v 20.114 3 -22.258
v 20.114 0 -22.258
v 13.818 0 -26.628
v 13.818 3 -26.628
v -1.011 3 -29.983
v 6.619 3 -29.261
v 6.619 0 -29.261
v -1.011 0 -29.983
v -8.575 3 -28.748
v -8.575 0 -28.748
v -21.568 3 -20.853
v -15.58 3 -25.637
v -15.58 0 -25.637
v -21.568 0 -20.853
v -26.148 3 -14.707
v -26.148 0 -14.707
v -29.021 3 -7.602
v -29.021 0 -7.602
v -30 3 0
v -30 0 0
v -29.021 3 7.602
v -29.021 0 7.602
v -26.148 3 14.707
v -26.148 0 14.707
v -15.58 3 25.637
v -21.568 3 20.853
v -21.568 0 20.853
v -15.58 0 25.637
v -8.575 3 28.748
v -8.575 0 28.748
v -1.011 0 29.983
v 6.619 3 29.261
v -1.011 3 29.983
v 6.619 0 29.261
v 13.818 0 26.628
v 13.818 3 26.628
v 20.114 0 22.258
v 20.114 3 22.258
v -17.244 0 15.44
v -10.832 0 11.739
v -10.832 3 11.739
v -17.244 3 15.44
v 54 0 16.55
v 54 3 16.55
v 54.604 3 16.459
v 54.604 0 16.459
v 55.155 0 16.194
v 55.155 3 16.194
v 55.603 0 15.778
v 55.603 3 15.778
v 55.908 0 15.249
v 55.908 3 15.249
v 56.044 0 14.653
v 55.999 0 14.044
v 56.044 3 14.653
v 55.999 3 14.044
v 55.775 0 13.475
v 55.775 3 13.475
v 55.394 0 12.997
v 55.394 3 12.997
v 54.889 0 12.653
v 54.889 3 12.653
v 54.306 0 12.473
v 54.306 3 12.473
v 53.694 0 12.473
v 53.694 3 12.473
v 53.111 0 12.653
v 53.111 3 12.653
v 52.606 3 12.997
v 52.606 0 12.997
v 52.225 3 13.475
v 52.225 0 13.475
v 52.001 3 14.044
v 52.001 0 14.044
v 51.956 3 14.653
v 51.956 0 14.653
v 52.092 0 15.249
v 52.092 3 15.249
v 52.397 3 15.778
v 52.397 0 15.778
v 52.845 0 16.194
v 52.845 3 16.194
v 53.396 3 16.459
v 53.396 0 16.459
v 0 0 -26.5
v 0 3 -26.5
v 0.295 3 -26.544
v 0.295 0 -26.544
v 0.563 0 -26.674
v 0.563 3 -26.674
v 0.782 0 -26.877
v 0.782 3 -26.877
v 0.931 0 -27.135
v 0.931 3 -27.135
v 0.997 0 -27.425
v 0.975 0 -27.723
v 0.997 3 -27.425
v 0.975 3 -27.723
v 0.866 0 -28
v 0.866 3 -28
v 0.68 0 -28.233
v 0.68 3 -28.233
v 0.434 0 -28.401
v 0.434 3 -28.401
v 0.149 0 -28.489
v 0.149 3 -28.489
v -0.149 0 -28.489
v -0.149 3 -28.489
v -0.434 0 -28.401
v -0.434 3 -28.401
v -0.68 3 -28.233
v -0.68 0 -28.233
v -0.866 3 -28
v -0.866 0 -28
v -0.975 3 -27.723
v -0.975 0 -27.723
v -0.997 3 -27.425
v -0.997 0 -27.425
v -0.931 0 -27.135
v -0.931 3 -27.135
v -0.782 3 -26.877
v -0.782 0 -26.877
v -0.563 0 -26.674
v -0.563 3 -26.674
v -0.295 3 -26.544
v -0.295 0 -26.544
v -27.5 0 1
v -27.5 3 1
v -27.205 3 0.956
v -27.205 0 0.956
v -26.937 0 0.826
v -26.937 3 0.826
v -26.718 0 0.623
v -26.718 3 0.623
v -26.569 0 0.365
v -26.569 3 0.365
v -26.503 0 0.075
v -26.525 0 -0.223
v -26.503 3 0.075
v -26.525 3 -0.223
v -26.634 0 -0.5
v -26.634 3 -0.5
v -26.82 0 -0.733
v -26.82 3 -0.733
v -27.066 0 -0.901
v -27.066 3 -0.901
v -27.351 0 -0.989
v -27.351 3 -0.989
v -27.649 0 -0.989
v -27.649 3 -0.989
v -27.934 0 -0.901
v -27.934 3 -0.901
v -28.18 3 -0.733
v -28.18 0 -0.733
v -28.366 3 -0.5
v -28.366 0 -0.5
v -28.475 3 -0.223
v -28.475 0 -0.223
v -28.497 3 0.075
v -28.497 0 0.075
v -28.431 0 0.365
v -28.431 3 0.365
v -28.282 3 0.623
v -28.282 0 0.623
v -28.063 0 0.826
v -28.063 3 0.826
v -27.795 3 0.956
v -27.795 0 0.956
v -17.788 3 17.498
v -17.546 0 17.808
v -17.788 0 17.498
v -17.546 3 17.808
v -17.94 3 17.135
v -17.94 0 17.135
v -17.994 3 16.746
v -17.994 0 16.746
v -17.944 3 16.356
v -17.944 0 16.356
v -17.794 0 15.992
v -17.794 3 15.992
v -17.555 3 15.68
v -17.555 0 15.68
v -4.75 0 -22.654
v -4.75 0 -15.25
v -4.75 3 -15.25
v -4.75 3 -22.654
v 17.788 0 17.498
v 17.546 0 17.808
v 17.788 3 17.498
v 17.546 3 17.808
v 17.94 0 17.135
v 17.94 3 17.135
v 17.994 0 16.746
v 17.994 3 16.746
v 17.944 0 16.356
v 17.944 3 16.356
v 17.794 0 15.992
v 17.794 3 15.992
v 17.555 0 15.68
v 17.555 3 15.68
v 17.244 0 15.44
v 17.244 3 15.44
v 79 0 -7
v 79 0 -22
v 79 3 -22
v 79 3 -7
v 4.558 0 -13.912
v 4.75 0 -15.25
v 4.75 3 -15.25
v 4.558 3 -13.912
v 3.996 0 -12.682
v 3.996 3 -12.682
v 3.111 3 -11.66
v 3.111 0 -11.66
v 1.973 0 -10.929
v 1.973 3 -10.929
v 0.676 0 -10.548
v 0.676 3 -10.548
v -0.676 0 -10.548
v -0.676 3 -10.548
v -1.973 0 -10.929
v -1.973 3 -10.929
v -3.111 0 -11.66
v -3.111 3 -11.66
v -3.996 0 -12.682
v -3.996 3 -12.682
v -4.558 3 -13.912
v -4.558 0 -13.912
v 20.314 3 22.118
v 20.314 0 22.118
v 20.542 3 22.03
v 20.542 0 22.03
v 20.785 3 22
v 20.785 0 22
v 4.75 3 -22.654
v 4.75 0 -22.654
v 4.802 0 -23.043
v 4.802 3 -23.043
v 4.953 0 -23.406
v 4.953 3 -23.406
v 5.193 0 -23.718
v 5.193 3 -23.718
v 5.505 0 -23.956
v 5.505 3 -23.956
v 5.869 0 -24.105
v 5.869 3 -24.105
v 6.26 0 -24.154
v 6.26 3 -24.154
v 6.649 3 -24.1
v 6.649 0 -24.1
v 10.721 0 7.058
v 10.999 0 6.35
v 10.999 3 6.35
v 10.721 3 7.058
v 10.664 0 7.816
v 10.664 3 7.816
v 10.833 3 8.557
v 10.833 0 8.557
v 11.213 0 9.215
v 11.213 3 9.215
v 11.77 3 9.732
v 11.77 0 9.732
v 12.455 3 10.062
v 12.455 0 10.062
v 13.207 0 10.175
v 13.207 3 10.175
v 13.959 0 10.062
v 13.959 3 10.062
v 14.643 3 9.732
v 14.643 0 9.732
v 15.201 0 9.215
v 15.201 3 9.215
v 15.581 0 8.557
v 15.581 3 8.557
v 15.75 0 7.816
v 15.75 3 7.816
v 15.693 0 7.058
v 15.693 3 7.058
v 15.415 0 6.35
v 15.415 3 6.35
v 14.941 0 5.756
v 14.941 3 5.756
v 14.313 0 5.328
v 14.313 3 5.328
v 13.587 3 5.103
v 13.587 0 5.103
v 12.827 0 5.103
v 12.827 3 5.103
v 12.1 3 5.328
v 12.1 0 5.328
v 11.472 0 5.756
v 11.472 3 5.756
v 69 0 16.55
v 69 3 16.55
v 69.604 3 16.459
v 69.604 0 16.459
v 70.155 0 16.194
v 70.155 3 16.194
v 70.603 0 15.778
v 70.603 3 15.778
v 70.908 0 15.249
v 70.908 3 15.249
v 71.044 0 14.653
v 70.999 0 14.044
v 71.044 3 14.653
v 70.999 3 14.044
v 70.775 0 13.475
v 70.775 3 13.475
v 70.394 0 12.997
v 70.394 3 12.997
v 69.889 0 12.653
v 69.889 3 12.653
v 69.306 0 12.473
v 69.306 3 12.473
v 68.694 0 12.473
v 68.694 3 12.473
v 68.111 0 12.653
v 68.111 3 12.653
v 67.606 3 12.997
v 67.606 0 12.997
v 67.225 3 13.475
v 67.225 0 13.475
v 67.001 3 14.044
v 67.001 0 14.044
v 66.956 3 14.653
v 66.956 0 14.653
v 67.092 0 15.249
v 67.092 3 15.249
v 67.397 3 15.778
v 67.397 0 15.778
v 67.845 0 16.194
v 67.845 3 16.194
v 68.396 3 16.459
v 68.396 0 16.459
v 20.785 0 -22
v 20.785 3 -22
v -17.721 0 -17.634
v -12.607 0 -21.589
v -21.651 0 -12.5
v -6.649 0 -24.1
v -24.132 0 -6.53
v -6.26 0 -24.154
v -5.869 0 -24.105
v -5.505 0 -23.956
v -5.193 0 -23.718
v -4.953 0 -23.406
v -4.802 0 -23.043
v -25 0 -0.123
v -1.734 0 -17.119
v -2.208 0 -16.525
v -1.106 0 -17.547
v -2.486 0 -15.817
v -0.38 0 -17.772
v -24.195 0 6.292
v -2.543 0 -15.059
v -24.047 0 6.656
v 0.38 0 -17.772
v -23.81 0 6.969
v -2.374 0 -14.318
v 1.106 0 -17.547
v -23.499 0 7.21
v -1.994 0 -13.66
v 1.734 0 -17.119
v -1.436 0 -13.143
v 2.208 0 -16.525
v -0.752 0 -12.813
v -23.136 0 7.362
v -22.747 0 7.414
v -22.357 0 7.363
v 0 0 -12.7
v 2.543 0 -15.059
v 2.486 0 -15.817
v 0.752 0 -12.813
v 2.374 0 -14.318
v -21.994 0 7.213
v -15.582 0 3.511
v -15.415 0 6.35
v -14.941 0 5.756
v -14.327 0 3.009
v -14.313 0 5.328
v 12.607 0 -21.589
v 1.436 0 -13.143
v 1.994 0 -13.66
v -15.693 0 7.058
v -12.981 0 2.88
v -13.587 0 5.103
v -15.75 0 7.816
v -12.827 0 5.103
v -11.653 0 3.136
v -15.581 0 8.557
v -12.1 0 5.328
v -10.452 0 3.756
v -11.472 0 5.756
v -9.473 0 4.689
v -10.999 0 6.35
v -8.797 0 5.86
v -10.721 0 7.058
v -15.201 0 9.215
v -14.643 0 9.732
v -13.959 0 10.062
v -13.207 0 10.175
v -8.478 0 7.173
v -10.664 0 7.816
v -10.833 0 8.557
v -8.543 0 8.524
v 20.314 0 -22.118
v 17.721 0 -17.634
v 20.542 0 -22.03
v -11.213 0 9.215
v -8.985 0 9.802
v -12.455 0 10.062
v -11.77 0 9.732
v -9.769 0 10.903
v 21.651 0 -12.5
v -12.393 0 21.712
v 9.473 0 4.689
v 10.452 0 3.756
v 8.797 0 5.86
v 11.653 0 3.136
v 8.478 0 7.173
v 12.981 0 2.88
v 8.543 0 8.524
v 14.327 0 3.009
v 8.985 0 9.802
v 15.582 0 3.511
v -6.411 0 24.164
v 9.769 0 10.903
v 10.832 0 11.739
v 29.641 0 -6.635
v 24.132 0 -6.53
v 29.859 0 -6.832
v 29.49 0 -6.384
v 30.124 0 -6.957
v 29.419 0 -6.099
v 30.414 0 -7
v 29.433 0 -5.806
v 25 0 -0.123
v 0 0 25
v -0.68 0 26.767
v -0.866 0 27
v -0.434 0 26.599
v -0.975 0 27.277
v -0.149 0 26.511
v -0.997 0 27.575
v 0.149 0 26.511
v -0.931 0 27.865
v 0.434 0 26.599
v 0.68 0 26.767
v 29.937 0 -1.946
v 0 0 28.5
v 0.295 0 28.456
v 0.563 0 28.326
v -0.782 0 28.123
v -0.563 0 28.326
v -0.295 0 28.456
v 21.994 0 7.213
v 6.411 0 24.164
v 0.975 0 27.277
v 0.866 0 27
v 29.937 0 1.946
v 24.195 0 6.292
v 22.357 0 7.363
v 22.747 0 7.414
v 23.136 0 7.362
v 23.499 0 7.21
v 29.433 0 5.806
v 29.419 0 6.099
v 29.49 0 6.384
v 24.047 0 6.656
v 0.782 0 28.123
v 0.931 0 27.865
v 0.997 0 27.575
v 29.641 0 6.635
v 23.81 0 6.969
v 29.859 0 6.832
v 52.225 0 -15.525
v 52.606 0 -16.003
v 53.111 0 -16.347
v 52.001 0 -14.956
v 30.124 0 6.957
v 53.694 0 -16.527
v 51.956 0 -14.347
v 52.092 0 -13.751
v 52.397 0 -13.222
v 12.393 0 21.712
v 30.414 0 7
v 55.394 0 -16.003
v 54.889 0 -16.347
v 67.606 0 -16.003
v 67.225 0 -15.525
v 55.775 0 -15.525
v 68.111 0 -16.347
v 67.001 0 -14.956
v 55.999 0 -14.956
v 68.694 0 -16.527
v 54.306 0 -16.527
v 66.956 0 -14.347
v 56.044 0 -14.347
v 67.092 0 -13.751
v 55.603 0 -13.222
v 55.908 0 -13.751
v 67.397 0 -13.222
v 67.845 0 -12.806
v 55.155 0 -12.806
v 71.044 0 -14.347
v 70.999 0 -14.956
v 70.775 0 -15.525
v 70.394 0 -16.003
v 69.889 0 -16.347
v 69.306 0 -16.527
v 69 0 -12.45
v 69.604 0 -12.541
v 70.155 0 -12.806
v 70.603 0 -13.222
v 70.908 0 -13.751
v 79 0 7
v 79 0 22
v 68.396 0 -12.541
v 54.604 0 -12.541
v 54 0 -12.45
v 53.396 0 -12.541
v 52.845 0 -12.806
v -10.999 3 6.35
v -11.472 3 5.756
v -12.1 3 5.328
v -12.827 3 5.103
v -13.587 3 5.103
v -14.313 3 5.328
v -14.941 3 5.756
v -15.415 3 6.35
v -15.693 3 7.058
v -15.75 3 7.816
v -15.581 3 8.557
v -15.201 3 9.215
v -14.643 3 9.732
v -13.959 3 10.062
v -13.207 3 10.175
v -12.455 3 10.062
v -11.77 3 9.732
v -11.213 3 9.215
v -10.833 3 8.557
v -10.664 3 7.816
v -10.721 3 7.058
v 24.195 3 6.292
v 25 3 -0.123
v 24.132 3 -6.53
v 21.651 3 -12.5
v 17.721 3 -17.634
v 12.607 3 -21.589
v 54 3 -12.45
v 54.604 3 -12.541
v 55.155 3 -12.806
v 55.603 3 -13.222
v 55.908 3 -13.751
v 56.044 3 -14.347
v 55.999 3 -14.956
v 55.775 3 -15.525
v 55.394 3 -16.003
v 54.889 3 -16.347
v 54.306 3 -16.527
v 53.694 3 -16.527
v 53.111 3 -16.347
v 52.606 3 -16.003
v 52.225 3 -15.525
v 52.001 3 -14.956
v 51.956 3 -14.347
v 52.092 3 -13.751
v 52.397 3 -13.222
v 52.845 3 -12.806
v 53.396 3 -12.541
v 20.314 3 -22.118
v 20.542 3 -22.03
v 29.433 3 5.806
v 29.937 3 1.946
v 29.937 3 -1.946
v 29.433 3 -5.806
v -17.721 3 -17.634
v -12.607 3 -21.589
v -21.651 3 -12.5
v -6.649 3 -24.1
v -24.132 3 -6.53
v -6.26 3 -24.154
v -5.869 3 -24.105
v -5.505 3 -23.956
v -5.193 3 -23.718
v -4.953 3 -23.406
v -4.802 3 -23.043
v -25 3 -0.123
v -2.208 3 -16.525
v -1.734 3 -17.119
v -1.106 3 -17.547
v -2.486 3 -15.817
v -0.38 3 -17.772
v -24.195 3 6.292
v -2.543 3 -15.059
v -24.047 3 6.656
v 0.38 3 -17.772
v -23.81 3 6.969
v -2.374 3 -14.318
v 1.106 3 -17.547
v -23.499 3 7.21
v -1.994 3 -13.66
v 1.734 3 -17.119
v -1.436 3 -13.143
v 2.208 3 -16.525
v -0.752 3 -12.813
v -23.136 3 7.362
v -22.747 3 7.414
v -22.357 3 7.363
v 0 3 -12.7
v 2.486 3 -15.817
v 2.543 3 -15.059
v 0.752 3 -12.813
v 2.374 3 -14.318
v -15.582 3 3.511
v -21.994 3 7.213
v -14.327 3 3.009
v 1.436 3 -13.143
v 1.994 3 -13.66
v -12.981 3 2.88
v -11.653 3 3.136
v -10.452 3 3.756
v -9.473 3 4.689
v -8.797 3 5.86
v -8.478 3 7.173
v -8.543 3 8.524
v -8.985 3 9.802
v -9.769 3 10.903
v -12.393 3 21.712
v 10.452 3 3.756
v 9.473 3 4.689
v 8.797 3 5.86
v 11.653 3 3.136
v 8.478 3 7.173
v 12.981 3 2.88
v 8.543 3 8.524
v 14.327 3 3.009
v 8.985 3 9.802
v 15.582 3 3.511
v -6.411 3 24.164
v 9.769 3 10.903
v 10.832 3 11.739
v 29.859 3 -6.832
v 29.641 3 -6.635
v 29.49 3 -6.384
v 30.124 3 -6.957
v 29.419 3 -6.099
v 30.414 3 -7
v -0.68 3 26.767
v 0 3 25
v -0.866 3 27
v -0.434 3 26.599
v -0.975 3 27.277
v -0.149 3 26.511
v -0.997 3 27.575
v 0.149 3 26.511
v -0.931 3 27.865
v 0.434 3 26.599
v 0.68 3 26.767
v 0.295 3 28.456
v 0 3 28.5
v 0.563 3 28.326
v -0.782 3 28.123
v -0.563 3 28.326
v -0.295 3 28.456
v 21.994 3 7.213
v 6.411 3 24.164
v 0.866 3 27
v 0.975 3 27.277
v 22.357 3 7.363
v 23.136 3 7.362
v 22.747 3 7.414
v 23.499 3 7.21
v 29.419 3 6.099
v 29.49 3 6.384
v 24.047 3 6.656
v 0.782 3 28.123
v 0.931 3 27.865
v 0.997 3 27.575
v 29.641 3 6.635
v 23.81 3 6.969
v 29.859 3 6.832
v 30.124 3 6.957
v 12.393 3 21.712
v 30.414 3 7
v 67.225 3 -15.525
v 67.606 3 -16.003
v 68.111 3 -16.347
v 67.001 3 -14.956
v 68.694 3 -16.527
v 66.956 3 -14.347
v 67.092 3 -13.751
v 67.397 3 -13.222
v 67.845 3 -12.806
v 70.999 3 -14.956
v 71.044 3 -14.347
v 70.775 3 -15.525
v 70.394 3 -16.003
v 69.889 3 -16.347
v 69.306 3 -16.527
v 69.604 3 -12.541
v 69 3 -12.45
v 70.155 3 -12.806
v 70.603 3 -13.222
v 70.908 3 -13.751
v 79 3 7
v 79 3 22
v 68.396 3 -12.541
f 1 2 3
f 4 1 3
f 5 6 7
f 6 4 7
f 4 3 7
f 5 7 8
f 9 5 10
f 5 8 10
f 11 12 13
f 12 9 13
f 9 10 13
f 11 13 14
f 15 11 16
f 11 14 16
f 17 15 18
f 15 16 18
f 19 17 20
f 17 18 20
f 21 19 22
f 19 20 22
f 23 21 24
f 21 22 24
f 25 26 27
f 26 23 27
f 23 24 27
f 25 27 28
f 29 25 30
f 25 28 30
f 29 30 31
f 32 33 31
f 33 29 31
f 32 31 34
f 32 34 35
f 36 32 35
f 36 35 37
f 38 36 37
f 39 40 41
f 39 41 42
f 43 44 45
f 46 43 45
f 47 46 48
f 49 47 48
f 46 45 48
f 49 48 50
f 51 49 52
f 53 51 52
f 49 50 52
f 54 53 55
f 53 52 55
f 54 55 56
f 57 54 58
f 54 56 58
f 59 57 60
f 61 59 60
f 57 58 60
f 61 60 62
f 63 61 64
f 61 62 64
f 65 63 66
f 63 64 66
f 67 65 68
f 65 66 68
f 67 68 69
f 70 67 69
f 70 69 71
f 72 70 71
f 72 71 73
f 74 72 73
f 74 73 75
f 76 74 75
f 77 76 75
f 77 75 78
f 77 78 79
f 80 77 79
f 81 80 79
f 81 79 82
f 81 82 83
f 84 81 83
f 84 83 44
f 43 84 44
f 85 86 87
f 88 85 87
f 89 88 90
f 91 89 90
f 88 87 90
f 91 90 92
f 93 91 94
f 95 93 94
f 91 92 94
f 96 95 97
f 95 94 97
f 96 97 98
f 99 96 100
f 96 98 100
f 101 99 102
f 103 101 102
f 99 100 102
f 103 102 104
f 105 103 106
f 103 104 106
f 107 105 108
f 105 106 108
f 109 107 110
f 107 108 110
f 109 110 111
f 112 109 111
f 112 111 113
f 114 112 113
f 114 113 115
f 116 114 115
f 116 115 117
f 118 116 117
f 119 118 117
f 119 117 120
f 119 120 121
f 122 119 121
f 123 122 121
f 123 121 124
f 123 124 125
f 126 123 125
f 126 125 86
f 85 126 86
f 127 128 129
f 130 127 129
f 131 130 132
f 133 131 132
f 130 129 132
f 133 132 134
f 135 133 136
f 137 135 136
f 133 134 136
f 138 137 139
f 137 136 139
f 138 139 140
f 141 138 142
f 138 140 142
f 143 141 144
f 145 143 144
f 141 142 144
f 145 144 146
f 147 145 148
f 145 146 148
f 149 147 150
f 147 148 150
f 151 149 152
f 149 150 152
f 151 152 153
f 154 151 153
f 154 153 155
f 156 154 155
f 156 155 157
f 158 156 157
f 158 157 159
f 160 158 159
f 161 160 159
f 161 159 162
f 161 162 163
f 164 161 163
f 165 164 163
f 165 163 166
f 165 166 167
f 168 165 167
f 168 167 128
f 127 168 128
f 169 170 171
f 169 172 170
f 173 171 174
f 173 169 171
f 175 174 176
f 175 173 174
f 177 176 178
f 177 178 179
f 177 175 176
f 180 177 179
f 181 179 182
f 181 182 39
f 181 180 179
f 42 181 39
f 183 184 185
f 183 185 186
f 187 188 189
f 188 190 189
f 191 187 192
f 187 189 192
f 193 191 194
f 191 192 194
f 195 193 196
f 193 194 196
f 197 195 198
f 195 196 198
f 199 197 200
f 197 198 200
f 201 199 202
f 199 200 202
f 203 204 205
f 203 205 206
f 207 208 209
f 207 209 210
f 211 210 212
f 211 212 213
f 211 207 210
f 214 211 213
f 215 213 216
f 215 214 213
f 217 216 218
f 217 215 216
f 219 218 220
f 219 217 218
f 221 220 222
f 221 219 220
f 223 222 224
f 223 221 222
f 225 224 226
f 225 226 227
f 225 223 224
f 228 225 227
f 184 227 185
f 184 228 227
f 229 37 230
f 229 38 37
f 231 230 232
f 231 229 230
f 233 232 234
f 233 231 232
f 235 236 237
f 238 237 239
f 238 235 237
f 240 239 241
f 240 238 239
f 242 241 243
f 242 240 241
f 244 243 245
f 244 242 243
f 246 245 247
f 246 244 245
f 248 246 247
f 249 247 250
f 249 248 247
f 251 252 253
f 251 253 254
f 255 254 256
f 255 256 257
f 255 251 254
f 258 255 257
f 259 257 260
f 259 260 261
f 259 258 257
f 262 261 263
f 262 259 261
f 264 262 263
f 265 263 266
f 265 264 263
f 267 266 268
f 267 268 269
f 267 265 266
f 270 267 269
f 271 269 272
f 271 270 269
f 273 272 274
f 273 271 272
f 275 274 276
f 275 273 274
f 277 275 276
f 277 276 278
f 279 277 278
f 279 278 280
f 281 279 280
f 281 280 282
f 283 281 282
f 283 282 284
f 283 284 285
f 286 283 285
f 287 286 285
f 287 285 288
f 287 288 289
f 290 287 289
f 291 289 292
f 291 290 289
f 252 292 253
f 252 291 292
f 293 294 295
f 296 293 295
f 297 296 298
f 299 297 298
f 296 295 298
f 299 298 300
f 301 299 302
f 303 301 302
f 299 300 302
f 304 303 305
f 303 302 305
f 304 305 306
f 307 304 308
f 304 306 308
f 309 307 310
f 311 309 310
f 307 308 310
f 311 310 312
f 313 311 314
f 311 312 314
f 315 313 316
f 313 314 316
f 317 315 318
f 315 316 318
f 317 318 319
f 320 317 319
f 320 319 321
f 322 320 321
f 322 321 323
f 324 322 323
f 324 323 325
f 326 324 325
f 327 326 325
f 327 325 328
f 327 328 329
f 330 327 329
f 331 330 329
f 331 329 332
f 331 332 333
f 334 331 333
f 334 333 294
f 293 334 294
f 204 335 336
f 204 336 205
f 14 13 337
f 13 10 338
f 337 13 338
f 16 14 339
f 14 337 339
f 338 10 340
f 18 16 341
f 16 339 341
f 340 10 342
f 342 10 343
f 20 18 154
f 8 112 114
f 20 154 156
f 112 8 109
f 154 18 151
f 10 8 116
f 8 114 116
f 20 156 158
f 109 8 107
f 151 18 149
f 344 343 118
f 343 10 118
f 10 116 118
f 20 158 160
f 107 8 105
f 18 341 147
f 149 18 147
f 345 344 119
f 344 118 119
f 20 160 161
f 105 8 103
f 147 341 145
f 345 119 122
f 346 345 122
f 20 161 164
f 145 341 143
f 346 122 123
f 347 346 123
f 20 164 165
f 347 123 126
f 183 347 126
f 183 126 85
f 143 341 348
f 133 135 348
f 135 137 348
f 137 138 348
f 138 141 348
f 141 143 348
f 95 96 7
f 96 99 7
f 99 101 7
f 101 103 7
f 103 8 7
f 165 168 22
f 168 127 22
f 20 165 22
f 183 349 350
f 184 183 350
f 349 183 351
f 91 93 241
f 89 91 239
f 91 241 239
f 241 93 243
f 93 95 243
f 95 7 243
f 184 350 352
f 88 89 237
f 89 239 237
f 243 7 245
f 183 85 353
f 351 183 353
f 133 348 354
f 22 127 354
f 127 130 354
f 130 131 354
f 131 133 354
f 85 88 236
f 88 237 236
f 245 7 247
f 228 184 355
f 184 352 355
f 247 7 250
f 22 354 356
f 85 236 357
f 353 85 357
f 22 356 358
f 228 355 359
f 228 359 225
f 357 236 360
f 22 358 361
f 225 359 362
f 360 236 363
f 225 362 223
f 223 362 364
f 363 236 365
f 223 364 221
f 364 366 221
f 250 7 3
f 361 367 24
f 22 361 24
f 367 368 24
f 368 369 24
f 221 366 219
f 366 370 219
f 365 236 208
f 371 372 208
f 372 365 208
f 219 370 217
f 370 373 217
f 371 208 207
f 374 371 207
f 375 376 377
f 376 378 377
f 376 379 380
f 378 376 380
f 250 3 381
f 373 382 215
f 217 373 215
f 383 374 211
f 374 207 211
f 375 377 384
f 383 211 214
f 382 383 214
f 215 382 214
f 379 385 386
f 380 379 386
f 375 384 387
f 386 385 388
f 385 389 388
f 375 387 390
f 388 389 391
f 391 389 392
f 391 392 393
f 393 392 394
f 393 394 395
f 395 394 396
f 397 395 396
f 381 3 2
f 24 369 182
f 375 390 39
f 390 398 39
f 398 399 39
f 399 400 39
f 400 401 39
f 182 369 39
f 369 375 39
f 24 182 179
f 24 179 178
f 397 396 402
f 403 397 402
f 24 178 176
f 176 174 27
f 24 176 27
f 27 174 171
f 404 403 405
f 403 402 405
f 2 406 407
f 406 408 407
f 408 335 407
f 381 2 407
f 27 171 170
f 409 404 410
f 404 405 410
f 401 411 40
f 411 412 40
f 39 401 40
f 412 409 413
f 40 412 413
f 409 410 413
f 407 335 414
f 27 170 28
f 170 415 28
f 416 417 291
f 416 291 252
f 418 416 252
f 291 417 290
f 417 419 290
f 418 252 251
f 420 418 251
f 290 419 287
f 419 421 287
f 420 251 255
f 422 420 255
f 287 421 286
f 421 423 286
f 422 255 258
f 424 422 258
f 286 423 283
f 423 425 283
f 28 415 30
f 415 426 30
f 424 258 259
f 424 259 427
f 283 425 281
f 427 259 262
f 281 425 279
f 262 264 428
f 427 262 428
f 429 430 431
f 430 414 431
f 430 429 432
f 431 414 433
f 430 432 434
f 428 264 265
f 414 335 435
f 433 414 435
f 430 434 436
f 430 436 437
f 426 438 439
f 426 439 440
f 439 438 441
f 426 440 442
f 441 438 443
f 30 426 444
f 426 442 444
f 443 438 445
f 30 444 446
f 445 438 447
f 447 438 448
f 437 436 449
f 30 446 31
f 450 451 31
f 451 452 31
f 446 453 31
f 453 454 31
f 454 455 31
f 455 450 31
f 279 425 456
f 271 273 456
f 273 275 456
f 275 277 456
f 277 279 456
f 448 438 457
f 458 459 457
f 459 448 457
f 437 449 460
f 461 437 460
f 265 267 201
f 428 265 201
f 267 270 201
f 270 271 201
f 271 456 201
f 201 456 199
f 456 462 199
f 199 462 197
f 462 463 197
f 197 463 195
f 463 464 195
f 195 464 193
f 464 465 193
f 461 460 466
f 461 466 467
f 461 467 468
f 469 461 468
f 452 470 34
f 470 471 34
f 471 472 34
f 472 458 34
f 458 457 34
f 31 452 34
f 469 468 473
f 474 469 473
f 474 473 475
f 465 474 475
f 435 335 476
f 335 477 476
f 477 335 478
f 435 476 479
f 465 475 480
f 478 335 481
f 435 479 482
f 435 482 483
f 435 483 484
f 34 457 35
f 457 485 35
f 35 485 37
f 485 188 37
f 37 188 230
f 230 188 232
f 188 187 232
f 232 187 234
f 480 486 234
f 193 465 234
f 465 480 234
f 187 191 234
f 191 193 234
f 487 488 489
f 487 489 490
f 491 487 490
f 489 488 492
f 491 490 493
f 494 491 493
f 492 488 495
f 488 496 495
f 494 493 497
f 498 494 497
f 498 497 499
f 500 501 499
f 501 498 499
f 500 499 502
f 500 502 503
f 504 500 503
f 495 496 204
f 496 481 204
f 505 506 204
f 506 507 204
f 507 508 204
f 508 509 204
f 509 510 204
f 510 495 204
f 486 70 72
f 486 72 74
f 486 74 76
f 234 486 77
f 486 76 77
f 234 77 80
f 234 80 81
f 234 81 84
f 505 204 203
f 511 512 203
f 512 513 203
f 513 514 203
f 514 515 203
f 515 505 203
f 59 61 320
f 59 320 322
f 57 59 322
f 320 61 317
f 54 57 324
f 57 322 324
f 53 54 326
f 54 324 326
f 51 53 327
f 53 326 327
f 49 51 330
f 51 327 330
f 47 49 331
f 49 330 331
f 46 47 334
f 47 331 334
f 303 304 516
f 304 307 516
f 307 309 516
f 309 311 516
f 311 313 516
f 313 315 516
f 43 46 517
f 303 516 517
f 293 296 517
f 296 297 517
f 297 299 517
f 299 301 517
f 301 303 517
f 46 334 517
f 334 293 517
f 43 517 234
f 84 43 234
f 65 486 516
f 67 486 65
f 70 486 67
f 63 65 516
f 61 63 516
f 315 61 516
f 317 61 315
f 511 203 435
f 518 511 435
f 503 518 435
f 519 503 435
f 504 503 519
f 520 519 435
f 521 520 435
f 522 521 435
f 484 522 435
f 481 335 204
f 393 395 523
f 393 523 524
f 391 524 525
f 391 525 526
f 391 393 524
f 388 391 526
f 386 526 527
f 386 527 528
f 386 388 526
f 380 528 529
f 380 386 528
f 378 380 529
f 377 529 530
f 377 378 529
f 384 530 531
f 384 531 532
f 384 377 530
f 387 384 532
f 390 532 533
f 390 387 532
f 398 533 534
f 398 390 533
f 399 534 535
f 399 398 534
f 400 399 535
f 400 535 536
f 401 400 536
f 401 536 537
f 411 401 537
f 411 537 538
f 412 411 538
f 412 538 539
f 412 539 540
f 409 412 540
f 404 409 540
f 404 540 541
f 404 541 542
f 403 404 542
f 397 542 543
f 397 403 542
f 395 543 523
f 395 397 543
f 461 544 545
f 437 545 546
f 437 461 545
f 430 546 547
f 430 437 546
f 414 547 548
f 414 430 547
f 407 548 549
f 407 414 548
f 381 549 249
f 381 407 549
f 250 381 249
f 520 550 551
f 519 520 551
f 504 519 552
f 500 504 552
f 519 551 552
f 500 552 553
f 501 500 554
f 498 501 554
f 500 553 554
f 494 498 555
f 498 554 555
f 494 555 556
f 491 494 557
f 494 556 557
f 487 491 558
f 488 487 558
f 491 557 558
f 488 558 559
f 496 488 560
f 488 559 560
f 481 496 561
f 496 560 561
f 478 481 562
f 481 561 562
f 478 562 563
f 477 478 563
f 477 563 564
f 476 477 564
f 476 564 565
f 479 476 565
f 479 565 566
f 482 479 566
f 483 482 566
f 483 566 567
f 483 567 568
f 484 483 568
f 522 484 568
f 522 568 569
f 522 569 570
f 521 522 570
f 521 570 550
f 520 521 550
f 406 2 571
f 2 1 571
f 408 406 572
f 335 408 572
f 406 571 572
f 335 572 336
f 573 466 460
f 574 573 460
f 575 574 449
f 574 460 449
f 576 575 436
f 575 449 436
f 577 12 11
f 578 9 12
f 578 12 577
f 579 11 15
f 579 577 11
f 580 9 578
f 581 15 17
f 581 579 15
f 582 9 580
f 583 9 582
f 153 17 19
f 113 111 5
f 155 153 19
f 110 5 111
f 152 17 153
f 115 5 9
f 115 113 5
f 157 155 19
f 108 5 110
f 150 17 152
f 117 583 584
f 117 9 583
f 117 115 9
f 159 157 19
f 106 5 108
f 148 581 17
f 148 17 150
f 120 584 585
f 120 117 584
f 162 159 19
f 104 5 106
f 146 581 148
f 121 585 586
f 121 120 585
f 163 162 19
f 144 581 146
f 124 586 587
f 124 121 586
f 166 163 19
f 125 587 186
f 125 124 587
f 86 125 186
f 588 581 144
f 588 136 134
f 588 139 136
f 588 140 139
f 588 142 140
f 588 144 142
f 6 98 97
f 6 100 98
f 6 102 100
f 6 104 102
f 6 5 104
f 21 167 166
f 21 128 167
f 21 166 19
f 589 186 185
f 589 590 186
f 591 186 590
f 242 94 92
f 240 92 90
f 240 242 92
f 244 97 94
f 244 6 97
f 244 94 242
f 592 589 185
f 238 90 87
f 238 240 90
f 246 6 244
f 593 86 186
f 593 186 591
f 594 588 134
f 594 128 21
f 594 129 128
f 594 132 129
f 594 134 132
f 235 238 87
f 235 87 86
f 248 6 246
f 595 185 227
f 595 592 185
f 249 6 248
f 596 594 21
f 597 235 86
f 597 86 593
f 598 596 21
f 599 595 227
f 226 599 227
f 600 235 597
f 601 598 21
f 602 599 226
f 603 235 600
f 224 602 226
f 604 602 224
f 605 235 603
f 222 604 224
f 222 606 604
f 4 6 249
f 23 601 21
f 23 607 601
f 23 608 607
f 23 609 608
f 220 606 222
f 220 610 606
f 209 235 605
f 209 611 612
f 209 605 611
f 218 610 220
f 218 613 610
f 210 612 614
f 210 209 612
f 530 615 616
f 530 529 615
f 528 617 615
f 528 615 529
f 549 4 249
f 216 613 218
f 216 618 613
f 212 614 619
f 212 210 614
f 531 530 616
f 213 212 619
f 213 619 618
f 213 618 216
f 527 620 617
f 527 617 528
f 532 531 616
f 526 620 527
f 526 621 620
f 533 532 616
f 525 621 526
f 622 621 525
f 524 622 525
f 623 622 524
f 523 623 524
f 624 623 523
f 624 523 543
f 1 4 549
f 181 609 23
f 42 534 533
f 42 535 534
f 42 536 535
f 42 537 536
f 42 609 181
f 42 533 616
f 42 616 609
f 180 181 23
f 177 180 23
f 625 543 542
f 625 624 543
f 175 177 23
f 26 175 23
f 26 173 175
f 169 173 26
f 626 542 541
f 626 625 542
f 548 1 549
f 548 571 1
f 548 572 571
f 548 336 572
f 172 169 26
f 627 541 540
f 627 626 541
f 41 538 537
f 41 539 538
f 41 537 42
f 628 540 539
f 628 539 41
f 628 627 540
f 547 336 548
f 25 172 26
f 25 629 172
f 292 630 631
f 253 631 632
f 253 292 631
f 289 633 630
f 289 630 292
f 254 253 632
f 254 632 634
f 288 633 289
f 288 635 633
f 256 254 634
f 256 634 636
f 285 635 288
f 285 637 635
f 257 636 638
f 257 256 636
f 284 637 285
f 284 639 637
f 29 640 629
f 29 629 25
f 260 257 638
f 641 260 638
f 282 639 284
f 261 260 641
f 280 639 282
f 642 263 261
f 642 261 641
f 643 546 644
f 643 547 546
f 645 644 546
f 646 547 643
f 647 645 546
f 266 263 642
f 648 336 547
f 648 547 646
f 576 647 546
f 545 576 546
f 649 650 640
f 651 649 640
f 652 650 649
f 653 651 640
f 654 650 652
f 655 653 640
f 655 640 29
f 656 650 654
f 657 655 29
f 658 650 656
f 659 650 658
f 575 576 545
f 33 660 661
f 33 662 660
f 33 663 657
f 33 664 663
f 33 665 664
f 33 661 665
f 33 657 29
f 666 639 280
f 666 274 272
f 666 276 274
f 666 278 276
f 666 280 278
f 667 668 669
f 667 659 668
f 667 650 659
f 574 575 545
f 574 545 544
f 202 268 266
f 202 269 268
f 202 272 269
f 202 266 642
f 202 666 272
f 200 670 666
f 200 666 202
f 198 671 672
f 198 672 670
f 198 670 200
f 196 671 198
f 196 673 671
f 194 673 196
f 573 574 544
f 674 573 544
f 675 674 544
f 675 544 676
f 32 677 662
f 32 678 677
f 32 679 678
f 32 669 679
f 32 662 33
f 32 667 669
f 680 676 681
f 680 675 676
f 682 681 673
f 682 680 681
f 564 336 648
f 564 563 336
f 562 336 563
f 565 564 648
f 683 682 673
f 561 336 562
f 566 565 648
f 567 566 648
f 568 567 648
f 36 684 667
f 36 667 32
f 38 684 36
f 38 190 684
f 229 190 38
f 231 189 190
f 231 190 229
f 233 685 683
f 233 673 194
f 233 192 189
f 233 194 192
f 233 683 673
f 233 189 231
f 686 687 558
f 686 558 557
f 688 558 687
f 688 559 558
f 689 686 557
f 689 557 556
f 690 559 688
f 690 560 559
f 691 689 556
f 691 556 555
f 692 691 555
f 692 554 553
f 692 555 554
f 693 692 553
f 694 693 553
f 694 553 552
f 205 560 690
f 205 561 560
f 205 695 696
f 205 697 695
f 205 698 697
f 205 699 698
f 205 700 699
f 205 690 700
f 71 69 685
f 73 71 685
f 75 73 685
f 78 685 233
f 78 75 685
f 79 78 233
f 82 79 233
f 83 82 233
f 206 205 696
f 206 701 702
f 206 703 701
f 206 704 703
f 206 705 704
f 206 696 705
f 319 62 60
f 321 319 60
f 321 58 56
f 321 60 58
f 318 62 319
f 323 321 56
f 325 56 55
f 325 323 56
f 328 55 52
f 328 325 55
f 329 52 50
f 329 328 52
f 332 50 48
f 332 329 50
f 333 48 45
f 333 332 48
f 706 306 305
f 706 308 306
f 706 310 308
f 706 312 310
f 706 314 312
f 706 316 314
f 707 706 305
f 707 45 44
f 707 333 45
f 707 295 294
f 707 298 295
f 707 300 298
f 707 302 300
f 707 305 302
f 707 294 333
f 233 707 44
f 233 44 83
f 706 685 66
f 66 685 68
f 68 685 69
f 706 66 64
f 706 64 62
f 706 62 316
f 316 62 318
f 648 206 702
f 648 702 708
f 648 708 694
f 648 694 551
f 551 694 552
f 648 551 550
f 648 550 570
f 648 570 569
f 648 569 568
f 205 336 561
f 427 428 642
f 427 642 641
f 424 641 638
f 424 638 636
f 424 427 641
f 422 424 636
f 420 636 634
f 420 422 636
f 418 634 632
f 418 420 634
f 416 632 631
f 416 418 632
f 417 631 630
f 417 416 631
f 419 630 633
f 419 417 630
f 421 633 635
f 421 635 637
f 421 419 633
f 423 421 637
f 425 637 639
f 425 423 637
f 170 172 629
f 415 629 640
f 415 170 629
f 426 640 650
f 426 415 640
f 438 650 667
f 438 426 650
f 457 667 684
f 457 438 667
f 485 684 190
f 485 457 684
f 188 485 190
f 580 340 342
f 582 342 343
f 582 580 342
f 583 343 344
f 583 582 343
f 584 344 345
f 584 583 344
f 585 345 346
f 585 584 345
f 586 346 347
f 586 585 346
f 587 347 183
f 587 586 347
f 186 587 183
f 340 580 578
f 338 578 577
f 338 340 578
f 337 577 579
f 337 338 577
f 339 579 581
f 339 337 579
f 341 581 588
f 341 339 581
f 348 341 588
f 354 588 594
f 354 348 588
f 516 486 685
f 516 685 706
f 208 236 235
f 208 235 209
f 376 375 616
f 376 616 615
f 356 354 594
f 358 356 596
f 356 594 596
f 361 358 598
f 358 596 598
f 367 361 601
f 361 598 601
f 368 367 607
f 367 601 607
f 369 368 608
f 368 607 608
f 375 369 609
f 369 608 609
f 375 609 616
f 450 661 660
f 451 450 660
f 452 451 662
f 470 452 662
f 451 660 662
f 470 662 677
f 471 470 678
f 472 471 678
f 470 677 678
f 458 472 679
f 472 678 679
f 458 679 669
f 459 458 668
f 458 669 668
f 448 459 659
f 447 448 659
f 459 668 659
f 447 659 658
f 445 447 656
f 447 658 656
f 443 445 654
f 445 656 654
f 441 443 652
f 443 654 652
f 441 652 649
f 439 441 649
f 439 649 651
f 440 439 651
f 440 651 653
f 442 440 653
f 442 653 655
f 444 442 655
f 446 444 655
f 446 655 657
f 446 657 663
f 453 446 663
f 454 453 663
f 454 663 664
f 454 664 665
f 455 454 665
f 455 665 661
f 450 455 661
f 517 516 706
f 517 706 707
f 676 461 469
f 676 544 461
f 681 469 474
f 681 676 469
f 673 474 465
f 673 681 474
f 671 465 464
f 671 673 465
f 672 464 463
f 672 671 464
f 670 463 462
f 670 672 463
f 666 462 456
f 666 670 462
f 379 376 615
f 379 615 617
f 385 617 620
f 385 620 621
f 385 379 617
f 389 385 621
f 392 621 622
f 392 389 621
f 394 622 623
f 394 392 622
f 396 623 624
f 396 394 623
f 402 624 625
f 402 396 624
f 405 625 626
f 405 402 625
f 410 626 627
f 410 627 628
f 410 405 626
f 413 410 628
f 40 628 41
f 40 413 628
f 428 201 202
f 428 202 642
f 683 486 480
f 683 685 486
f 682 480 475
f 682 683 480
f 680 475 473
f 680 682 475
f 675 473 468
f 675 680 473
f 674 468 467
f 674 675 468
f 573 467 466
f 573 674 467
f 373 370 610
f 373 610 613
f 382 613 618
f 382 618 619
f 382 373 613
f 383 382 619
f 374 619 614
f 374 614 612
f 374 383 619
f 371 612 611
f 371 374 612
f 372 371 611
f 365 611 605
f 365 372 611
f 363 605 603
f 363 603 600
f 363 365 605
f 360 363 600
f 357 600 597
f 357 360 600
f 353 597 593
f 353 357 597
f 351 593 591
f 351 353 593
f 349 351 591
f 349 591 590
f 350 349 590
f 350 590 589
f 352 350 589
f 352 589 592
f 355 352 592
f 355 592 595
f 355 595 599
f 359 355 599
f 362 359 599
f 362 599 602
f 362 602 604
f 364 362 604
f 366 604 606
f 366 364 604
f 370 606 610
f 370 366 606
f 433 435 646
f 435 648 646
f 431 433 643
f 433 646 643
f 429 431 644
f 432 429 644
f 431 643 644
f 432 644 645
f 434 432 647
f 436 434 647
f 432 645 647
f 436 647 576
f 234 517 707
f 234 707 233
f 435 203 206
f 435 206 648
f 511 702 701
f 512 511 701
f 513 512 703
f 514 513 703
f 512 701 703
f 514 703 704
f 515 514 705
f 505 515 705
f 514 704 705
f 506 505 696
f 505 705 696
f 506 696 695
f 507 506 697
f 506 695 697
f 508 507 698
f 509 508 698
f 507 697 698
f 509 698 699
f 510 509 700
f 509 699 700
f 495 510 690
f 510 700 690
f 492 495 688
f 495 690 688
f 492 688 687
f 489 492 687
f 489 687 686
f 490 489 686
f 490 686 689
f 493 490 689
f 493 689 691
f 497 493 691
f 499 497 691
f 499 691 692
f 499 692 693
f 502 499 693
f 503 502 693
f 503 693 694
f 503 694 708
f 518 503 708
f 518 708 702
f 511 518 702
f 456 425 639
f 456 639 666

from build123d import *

# Parameters (mm, degrees)
SKETCH1_R           = 30
SKETCH1_R_2         = 25
BOSS_EXTRUDE1_DEPTH = 3
BOSS_EXTRUDE2_START = -3
SKETCH2_R           = 2.55
BOSS_EXTRUDE2_DEPTH = 3
CIRPATTERN1_COUNT   = 3
FILLET1_R           = 1.5
BOSS_EXTRUDE3_START = -3
BOSS_EXTRUDE3_DEPTH = 3
SKETCH4_R           = 2.05
CUT_EXTRUDE1_DEPTH  = 85.557672626
SKETCH5_R           = 1
CUT_EXTRUDE2_DEPTH  = 85.557672626
FILLET2_R           = 1


with BuildPart() as part:
    # Sketch1 → Boss-Extrude1 (new body)
    with BuildSketch(Plane(origin=(0, 0, 0), x_dir=(1, 0, 0), z_dir=(0, 1, 0))):
        with Locations(Location((0, 0, 0), (0, 0, 270))):
            Circle(SKETCH1_R)
        with Locations(Location((0, 0, 0), (0, 0, 270))):
            Circle(SKETCH1_R_2, mode=Mode.SUBTRACT)
    extrude(amount=BOSS_EXTRUDE1_DEPTH)

    # Sketch2 → Boss-Extrude2 (add)
    with BuildSketch(Plane(origin=(0, 3, 0), x_dir=(1, 0, 0), z_dir=(0, 1, 0)).offset(BOSS_EXTRUDE2_START)):
        with BuildLine():
            Line((-4.75, 15.25), (-4.75, 24.544602258))
            ThreePointArc((-4.75, 24.544602258), (0, 25), (4.75, 24.544602258))
            Line((4.75, 24.544602258), (4.75, 15.25))
            ThreePointArc((4.75, 15.25), (0, 10.5), (-4.75, 15.25))
        make_face()
        with Locations(Location((0, 15.25, 0), (0, 0, 270))):
            Circle(SKETCH2_R, mode=Mode.SUBTRACT)
    boss_extrude2 = extrude(amount=BOSS_EXTRUDE2_DEPTH)

    # CirPattern1: Boss-Extrude2 ×3 about axis
    cirpattern1_axis = Axis((0, 0, 0), (0, 1, 0))
    for i in range(1, CIRPATTERN1_COUNT):
        add(boss_extrude2.rotate(cirpattern1_axis, i * 360 / CIRPATTERN1_COUNT))

    # Fillet1
    fillet1_edges = [part.edges().sort_by_distance(p)[0] for p in [
        (4.75, 1.5, -24.544602258),
        (-4.75, 1.5, -24.544602258),
        (18.881249081, 1.5, 16.385921797),
        (23.631249081, 1.5, 8.158680461),
        (-23.631249081, 1.5, 8.158680461),
        (-18.881249081, 1.5, 16.385921797),
    ]]
    fillet(fillet1_edges, radius=FILLET1_R)

    # Sketch3 → Boss-Extrude3 (add)
    with BuildSketch(Plane(origin=(0, 3, 0), x_dir=(1, 0, 0), z_dir=(0, 1, 0)).offset(BOSS_EXTRUDE3_START)):
        with BuildLine():
            Line((20.396078054, 22), (79, 22))
            Line((79, 22), (79, 7))
            Line((79, 7), (29.171904292, 7))
            ThreePointArc((29.171904292, 7), (25.893941733, 15.149382216), (20.396078054, 22))
        make_face()
        with BuildLine():
            Line((29.171904292, -7), (79, -7))
            Line((79, -7), (79, -22))
            Line((79, -22), (20.396078054, -22))
            ThreePointArc((20.396078054, -22), (25.893941733, -15.149382216), (29.171904292, -7))
        make_face()
    extrude(amount=BOSS_EXTRUDE3_DEPTH)

    # Sketch4 → Cut-Extrude1 (cut, through all)
    with BuildSketch(Plane(origin=(0, 3, 0), x_dir=(1, 0, 0), z_dir=(0, 1, 0))):
        with Locations(Location((54, 14.5, 0), (0, 0, 270))):
            Circle(SKETCH4_R)
        with Locations(Location((69, 14.5, 0), (0, 0, 270))):
            Circle(SKETCH4_R)
        with Locations(Location((54, -14.5, 0), (0, 0, 270))):
            Circle(SKETCH4_R)
        with Locations(Location((69, -14.5, 0), (0, 0, 270))):
            Circle(SKETCH4_R)
    extrude(amount=-CUT_EXTRUDE1_DEPTH, mode=Mode.SUBTRACT)

    # Sketch5 → Cut-Extrude2 (cut, through all)
    with BuildSketch(Plane(origin=(0, 3, 0), x_dir=(1, 0, 0), z_dir=(0, 1, 0))):
        with Locations(Location((0, 27.5, 0), (0, 0, 270))):
            Circle(SKETCH5_R)
        with Locations(Location((-27.5, 0, 0), (0, 0, 270))):
            Circle(SKETCH5_R)
        with Locations(Location((0, -27.5, 0), (0, 0, 270))):
            Circle(SKETCH5_R)
    extrude(amount=-CUT_EXTRUDE2_DEPTH, mode=Mode.SUBTRACT)

    # Fillet2
    fillet2_edges = [part.edges().sort_by_distance(p)[0] for p in [
        (20.396078054, 1.5, 22),
        (29.171904292, 1.5, 7),
        (29.171904292, 1.5, -7),
        (20.396078054, 1.5, -22),
    ]]
    fillet(fillet2_edges, radius=FILLET2_R)


solid = part.part
